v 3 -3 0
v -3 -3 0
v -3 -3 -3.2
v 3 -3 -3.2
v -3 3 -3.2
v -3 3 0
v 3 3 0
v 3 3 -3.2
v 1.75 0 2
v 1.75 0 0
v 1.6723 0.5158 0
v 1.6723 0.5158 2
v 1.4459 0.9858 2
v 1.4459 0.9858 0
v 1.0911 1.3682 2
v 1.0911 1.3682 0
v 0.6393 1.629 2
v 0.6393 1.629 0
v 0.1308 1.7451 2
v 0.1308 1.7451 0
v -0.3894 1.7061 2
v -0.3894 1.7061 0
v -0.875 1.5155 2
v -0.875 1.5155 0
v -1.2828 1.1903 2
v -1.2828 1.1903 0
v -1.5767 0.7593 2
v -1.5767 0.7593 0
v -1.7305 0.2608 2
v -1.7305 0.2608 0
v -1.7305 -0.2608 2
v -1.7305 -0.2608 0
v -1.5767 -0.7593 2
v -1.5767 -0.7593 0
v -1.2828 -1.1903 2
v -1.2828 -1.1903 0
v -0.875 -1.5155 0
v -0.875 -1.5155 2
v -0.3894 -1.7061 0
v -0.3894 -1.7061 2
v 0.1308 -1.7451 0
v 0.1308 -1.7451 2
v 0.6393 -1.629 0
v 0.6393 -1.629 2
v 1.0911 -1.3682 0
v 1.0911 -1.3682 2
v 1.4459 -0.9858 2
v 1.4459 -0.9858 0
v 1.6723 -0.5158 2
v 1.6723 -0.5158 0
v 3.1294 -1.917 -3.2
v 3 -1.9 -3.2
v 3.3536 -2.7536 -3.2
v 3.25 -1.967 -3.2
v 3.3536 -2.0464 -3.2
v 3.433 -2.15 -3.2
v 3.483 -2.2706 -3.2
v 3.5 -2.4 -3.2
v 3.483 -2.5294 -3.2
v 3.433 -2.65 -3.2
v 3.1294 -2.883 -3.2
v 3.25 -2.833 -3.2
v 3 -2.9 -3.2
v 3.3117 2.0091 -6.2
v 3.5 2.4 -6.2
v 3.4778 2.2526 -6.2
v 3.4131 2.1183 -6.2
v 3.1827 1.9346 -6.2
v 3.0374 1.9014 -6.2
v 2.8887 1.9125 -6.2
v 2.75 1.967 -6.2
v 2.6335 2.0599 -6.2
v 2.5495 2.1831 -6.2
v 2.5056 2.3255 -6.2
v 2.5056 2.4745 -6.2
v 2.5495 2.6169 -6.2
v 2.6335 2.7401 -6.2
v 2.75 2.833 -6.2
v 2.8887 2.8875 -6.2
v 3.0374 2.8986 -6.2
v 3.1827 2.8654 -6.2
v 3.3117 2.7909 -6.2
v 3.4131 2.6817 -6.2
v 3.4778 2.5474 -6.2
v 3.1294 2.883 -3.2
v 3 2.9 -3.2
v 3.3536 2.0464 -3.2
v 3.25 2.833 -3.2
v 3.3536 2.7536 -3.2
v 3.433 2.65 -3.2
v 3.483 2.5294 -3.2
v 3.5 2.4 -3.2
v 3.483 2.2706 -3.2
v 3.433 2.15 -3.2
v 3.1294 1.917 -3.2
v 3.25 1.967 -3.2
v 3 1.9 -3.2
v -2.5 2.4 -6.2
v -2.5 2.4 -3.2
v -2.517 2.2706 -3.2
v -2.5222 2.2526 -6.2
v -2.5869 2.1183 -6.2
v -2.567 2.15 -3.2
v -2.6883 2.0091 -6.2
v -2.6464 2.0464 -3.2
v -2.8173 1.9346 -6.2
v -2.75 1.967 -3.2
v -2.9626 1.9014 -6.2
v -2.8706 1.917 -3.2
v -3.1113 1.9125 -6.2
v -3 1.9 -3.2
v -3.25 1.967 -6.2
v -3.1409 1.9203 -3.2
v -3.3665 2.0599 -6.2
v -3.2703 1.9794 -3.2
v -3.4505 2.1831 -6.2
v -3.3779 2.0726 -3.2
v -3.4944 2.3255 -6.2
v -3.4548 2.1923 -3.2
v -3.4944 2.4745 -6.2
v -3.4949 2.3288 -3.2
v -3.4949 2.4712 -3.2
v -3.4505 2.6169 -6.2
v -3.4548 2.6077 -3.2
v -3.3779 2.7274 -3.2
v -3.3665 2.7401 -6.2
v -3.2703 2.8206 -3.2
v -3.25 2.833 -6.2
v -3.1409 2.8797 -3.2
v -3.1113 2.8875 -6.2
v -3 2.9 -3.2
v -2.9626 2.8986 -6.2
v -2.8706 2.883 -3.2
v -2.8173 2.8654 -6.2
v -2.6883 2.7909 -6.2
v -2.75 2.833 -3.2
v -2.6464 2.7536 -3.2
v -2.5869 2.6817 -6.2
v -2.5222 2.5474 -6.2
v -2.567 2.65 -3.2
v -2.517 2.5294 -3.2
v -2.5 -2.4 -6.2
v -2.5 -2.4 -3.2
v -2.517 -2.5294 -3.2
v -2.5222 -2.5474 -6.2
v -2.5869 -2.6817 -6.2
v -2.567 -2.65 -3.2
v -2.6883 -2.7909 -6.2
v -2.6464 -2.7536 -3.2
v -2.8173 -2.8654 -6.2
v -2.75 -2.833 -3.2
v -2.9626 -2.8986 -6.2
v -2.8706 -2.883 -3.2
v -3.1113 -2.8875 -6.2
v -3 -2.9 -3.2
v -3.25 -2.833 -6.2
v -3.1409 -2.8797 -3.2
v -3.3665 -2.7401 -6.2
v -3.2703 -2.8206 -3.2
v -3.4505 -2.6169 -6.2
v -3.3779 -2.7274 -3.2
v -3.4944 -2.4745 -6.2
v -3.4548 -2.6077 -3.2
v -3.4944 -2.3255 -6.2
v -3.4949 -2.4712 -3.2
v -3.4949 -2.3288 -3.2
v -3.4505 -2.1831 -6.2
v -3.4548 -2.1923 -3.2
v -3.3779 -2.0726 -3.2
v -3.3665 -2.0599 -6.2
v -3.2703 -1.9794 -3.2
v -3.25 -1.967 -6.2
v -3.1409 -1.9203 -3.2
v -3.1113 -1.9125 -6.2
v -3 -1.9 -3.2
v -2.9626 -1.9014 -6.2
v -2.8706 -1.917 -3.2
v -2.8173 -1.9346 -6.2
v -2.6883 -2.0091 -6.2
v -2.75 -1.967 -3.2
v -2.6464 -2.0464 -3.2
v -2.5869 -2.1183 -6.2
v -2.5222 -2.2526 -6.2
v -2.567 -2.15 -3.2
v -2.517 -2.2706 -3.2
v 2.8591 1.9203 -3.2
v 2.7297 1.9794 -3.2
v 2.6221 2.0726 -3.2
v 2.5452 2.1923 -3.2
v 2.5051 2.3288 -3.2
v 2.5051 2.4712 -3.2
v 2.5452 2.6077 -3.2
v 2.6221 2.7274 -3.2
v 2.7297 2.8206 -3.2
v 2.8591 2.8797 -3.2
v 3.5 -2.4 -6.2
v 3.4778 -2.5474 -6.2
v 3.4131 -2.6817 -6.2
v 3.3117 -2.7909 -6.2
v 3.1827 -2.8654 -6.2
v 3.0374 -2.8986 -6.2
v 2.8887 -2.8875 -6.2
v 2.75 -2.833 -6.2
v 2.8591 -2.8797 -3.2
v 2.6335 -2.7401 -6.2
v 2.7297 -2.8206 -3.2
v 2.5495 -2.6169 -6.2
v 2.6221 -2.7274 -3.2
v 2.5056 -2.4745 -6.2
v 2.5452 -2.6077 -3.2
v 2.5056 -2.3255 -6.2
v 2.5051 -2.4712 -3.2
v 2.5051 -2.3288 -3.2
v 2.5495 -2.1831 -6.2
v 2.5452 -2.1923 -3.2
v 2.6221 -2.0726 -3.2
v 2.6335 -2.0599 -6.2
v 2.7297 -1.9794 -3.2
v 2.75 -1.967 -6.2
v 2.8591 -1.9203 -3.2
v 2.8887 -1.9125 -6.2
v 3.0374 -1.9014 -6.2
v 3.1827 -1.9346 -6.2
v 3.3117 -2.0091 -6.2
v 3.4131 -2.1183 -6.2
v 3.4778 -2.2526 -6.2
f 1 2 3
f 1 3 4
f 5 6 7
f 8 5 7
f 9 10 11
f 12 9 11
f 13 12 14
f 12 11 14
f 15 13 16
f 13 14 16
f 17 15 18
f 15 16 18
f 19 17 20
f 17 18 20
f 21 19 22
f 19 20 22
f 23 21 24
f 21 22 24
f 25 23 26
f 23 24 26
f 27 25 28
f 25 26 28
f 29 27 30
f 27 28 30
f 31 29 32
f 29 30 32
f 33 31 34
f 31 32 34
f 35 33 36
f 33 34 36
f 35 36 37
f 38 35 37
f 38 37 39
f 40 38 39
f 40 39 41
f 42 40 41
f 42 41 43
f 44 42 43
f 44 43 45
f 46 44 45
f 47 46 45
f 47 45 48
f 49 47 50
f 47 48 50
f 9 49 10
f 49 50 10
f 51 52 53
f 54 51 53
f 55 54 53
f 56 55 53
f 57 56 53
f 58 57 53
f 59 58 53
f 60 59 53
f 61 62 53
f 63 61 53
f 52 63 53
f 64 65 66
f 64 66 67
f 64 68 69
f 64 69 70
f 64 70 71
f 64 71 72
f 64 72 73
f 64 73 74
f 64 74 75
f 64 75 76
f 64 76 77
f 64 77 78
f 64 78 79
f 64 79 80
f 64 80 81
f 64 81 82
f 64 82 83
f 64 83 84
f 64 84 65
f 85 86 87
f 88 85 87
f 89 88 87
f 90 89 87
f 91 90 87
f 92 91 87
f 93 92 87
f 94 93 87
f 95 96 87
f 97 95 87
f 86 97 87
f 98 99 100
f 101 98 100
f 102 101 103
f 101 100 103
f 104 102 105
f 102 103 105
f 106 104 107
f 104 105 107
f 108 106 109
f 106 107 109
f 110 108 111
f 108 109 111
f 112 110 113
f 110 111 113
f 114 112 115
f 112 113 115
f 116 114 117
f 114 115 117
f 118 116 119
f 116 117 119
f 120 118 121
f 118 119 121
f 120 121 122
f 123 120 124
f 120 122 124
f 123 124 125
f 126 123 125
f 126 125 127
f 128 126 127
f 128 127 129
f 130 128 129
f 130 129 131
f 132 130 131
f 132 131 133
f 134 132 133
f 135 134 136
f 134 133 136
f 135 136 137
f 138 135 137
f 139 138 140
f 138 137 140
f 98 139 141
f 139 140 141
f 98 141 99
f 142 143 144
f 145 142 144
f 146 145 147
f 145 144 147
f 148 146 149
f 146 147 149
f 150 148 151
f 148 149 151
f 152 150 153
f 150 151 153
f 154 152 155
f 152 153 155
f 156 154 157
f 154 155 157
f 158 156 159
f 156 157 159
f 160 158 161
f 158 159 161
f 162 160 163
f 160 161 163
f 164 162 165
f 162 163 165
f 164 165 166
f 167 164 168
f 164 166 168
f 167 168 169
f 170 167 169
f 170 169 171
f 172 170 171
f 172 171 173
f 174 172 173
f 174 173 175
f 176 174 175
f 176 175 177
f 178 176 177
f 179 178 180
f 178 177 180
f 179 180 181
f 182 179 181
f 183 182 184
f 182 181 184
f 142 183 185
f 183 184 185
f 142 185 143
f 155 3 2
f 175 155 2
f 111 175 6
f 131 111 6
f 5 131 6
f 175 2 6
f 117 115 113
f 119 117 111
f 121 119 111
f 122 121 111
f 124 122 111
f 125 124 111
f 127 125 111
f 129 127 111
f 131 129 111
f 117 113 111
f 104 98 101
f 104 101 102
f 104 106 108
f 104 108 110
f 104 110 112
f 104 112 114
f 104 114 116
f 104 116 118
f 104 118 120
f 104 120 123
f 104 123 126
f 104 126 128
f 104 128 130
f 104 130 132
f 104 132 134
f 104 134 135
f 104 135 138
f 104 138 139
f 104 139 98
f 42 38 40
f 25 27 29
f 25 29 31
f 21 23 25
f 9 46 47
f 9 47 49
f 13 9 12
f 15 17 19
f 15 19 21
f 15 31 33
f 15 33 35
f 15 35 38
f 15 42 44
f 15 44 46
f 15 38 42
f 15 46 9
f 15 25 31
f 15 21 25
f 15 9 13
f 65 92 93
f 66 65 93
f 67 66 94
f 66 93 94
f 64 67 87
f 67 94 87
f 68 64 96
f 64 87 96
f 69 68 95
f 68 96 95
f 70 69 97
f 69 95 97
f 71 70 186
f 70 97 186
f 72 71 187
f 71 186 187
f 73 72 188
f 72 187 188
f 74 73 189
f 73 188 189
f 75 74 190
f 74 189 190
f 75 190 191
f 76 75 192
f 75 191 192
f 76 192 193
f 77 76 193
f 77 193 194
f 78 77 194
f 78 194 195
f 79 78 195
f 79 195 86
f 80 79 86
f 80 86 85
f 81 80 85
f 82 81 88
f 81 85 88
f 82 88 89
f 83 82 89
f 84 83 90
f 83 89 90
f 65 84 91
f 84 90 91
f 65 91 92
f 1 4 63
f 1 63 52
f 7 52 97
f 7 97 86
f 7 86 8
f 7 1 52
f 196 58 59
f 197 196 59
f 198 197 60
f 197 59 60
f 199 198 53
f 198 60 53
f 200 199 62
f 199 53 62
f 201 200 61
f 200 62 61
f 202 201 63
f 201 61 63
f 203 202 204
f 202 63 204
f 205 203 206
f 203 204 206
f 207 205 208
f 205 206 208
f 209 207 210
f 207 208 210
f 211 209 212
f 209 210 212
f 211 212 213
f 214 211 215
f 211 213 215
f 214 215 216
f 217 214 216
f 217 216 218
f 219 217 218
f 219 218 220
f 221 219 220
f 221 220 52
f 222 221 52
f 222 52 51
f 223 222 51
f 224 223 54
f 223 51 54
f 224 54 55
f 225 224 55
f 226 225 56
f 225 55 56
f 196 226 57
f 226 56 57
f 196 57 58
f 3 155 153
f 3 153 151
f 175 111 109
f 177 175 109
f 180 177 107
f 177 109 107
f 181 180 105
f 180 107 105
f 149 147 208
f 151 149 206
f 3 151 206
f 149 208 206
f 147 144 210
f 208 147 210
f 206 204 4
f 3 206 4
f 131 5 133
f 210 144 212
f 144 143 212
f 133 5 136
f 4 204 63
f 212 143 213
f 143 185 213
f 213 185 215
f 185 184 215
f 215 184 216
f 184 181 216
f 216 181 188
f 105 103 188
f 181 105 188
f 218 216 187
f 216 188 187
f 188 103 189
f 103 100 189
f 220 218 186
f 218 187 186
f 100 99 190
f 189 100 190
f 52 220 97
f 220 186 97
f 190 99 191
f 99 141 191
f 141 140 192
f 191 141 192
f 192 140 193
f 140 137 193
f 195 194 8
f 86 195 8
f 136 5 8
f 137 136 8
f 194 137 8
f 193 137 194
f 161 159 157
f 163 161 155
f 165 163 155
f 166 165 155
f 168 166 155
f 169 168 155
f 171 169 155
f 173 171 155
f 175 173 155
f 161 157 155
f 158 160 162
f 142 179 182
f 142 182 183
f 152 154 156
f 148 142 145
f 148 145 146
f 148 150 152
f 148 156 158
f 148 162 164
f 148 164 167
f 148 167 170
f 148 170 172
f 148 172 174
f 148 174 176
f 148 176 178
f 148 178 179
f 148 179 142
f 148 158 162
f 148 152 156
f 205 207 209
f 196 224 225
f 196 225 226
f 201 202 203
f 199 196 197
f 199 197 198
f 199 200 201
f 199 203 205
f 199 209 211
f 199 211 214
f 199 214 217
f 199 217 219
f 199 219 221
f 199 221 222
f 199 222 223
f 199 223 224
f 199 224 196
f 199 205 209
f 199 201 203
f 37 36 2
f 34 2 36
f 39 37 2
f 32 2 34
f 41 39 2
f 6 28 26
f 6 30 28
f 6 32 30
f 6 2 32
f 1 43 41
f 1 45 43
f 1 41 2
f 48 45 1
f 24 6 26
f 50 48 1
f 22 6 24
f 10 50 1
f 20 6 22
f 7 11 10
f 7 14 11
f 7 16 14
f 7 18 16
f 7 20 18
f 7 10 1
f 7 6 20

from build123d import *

# Parameters (mm, degrees)
F0_W     = 6
F0_H     = 6
F1_DEPTH = 3.2
F2_R     = 1.75
F3_DEPTH = 2
F4_R     = 0.5
F5_DEPTH = 3


with BuildPart() as f1:
    # F0 (on Top) → F1 (new body)
    with BuildSketch(Plane.XY):
        Rectangle(F0_W, F0_H)
    extrude(amount=-F1_DEPTH)

    # F2 (on face) → F3 (join)
    with BuildSketch(Plane.XY):
        Circle(F2_R)
    extrude(amount=F3_DEPTH)

    # F4 (on face) → F5 (join)
    with BuildSketch(Plane(origin=(0, 0, -3.2), x_dir=(1, 0, 0), z_dir=(0, 0, -1))):
        with Locations((-3, 2.4)):
            Circle(F4_R)
        with Locations((3, 2.4)):
            Circle(F4_R)
        with Locations((-3, -2.4)):
            Circle(F4_R)
        with Locations((3, -2.4)):
            Circle(F4_R)
    extrude(amount=F5_DEPTH)


solid = f1.part
